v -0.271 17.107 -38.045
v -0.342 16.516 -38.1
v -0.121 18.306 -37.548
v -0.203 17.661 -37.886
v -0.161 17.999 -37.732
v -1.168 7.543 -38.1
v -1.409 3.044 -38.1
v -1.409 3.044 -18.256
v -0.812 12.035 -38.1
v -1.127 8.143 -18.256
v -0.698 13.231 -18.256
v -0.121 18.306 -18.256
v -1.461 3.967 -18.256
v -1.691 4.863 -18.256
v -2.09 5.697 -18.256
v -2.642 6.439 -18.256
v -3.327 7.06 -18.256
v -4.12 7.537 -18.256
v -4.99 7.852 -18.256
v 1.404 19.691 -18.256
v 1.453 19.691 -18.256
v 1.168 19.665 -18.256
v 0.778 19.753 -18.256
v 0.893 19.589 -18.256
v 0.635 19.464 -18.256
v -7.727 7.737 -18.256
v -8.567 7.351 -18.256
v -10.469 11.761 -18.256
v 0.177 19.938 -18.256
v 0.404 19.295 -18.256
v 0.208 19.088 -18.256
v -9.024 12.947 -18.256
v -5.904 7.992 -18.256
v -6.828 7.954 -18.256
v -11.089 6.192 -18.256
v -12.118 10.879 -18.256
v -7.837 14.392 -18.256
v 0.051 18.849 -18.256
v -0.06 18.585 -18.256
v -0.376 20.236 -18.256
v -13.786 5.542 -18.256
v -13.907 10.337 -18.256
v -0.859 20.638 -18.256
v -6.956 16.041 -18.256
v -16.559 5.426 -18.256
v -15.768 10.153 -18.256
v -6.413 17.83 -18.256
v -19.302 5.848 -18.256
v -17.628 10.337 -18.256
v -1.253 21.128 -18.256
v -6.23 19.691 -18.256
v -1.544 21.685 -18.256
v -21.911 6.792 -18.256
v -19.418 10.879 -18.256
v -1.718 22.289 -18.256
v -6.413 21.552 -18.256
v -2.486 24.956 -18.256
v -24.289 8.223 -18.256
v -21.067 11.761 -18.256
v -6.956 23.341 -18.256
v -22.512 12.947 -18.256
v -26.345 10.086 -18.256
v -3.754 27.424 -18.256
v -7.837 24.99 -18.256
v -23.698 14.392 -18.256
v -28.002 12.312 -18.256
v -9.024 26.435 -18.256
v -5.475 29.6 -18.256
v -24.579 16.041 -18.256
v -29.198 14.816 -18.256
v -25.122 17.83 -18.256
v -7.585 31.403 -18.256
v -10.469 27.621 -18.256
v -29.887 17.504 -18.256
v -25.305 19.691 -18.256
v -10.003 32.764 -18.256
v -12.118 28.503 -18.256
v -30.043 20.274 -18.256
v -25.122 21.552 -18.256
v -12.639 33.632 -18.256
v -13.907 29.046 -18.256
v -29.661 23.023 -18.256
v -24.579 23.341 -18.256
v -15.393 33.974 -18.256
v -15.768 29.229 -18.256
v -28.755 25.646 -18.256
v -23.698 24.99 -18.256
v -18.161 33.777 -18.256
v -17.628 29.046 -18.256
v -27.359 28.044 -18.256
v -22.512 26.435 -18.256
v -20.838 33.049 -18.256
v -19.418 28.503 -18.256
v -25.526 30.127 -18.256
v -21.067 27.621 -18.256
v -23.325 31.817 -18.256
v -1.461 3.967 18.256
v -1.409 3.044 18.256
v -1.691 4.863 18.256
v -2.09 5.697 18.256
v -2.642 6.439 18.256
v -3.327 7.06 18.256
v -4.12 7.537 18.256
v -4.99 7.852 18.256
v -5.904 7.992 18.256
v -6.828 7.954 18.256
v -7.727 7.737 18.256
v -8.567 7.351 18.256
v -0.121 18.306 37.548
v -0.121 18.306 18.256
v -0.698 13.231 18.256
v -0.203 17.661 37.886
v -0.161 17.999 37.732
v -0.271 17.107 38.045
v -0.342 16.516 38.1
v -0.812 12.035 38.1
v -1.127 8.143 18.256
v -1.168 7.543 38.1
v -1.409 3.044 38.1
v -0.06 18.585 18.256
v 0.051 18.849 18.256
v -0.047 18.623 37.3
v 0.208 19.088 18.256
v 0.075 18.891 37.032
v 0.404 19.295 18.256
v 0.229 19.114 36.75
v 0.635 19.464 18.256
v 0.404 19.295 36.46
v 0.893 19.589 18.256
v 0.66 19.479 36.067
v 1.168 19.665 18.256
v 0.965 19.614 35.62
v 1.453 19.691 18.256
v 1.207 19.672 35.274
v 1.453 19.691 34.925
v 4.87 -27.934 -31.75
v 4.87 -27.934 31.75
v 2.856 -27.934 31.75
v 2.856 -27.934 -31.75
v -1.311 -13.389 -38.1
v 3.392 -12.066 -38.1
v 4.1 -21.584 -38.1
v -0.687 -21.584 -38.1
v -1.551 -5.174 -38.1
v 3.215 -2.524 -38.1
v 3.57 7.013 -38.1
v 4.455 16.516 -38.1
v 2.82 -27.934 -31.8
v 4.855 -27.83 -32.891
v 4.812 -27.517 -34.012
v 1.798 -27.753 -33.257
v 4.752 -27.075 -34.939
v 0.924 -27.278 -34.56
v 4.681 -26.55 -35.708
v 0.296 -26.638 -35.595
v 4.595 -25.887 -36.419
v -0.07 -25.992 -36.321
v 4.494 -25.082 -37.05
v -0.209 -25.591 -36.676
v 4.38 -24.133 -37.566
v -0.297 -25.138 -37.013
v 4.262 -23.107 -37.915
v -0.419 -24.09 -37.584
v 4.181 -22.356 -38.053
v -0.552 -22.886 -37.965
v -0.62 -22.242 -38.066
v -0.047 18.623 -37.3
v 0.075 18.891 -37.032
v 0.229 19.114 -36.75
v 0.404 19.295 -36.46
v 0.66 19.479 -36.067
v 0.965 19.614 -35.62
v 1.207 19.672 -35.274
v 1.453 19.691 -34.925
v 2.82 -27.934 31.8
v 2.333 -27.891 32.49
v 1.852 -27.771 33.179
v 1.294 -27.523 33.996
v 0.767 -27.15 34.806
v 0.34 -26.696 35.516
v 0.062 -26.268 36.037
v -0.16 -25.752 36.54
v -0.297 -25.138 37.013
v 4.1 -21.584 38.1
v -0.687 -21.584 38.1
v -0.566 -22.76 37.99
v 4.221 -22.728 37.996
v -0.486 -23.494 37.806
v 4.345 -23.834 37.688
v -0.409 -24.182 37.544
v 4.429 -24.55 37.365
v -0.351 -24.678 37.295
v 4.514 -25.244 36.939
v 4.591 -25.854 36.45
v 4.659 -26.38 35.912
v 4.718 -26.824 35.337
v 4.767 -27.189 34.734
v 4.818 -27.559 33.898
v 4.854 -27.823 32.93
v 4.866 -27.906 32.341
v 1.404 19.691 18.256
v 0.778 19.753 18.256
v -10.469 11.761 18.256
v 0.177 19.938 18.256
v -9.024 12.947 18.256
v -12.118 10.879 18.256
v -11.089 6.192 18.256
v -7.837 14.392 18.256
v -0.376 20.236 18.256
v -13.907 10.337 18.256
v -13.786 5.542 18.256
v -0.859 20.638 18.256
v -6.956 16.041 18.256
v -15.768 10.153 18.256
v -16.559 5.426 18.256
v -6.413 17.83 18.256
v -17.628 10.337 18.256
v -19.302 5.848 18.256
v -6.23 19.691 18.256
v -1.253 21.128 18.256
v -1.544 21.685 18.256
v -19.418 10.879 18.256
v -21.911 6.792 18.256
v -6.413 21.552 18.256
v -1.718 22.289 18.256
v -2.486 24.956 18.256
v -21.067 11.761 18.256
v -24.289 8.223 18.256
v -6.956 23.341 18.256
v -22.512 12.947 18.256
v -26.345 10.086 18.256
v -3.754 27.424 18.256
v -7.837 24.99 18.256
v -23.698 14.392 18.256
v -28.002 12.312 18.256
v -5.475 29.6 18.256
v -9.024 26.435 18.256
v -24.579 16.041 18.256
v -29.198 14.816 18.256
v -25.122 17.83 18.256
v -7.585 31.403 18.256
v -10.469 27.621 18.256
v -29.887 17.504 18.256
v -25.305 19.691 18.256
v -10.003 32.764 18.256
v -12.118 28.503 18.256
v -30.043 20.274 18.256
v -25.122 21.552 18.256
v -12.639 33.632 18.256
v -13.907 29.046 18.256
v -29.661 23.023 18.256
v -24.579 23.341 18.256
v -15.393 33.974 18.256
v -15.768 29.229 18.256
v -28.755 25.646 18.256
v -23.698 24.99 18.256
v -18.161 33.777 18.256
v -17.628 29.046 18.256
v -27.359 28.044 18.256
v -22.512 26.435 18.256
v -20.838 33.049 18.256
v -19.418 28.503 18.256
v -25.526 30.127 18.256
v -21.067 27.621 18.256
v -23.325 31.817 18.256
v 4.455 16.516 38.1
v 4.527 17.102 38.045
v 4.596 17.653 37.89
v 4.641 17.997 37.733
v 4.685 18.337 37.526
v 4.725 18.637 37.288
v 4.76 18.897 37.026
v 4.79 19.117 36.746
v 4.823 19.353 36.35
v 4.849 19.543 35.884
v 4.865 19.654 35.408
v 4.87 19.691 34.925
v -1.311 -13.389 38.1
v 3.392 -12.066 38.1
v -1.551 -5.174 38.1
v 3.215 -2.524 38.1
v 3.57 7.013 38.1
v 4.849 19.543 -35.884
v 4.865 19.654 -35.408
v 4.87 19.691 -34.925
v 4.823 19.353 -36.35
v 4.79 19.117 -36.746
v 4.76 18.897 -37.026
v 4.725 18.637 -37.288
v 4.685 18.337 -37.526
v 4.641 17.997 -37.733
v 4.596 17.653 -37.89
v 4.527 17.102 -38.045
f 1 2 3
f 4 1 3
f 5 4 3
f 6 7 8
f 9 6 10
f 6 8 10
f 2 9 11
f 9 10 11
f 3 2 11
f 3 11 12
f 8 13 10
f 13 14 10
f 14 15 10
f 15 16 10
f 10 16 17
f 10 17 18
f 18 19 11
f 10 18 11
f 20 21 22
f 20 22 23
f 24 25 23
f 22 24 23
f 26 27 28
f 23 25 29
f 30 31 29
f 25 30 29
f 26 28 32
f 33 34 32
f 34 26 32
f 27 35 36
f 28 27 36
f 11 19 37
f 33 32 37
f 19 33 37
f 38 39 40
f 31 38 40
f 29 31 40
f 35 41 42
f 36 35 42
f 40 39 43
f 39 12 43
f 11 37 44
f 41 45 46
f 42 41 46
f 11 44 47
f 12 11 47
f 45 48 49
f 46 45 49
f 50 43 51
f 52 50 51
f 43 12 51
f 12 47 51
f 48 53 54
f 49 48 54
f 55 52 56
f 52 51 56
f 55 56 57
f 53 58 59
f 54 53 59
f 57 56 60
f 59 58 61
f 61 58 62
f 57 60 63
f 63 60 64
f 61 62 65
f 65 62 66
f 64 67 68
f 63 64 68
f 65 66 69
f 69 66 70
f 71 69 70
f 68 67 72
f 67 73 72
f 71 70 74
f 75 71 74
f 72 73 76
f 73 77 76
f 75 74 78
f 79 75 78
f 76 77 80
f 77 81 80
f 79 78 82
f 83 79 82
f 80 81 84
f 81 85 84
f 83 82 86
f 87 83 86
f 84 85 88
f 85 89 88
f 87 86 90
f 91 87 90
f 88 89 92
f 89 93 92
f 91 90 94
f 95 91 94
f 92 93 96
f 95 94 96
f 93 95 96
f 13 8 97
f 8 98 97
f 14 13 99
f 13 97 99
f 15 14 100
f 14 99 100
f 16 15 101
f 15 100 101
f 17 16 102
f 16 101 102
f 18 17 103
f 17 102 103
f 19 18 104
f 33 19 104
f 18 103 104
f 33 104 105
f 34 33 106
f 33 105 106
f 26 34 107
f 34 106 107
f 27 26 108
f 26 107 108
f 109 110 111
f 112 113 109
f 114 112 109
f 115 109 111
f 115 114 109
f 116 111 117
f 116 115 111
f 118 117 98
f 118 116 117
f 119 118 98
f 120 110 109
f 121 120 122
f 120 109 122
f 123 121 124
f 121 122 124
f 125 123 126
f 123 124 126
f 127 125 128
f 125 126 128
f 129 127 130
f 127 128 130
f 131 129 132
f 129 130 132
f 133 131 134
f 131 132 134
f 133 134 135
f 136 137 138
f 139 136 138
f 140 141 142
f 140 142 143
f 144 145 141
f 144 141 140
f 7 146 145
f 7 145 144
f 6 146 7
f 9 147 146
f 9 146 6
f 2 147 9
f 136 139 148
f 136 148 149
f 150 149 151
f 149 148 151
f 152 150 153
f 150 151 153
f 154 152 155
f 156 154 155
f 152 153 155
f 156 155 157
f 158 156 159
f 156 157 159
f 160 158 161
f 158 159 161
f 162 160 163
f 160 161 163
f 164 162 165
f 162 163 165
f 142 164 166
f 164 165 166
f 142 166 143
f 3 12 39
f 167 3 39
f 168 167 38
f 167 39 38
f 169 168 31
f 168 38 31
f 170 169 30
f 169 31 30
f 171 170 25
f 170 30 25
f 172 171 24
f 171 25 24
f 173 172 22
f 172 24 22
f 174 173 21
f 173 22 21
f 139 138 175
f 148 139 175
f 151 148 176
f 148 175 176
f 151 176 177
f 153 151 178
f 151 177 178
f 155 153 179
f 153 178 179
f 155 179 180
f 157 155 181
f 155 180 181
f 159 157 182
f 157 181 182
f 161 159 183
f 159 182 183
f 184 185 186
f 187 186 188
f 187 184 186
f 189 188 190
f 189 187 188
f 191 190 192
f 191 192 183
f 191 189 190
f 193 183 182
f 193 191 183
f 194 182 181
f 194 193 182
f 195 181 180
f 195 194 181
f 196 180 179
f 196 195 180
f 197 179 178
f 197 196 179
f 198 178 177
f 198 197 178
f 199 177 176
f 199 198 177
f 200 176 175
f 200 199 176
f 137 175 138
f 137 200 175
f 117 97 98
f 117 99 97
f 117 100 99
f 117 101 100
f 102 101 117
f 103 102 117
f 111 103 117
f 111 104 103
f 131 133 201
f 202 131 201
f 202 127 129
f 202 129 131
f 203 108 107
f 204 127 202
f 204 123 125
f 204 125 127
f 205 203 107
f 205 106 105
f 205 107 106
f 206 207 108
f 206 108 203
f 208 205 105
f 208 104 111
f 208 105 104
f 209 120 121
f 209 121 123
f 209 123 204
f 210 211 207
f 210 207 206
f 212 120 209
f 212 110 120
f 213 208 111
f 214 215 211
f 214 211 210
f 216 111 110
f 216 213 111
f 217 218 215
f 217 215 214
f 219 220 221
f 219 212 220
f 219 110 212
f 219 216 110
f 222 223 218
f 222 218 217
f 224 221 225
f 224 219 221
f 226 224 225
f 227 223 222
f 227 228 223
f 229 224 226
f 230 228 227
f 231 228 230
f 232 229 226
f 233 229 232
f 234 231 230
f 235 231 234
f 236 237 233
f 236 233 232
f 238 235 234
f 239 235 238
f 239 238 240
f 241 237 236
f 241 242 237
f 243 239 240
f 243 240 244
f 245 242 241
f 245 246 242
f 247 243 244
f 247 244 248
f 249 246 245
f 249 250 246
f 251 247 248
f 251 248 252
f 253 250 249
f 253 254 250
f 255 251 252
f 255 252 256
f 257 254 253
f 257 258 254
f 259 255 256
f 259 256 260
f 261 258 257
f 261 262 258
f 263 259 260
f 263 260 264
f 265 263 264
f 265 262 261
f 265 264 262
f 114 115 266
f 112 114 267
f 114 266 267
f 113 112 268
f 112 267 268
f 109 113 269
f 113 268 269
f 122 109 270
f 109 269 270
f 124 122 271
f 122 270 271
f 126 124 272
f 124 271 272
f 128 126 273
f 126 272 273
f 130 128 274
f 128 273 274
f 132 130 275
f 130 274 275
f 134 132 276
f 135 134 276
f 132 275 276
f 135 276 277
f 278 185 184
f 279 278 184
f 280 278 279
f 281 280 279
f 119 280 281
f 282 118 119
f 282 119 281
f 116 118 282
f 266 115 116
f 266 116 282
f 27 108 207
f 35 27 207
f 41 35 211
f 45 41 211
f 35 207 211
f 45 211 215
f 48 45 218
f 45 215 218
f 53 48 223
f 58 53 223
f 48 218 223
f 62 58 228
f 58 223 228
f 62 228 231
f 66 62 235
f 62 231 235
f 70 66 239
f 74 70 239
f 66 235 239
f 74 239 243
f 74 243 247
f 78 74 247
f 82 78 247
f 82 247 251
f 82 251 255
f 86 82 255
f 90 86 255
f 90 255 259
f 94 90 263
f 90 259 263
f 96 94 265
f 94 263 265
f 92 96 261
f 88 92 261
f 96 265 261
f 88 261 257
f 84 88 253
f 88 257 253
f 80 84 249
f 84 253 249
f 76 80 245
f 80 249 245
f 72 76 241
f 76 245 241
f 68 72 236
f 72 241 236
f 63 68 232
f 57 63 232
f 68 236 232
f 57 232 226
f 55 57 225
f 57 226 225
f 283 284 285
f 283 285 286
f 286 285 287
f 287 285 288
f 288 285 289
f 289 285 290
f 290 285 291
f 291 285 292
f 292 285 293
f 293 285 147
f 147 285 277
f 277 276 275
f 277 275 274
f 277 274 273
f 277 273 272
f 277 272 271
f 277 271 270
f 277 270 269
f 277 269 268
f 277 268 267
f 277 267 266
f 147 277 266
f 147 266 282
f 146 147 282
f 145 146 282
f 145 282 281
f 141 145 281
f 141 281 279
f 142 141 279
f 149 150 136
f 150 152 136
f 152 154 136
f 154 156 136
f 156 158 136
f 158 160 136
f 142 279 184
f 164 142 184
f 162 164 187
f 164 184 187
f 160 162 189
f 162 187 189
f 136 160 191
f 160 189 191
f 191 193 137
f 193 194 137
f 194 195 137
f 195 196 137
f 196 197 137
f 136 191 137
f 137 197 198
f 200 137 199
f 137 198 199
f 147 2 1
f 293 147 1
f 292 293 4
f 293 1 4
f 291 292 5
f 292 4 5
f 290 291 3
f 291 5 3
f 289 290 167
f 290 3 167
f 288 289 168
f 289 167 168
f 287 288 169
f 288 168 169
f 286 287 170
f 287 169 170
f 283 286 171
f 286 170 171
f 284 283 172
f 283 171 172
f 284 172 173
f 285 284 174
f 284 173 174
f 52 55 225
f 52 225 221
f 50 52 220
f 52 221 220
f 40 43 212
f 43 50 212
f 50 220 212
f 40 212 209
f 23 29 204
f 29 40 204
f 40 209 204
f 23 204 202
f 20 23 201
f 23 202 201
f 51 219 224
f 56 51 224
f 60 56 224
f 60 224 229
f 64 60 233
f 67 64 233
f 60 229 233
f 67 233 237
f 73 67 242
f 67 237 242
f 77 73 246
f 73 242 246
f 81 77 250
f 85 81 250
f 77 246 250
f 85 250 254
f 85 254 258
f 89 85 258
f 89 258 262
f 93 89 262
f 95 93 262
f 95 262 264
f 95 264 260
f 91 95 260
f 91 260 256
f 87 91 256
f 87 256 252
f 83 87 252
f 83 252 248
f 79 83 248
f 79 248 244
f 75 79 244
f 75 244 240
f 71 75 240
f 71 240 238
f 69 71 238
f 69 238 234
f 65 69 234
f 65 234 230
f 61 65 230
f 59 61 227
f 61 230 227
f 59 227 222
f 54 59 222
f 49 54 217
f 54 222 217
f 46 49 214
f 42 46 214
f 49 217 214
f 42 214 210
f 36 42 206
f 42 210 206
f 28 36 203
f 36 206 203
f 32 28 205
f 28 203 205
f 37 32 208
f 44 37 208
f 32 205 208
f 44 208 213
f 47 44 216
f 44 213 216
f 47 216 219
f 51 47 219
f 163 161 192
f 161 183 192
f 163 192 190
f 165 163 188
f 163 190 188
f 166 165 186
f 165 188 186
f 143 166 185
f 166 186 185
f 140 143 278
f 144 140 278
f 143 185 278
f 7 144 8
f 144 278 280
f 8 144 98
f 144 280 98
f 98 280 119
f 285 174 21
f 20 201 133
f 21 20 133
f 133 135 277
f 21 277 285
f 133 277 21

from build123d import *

# Parameters (mm, degrees)
BOSS_EXTRUDE1_DEPTH = 18.25625
SKETCH2_R           = 9.5377
CUT_EXTRUDE1_DEPTH  = 59.232550302
BOSS_EXTRUDE2_START = 19.84375
BOSS_EXTRUDE2_DEPTH = 19.84375
BOSS_EXTRUDE3_DEPTH = 19.84375
FILLET2_R           = 6.35
FILLET3_R           = 3.175
FILLET5_R           = 1.5875
FILLET6_R           = 3.175


with BuildPart() as part:
    # Sketch1 → Boss-Extrude1 (new, symmetric)
    with BuildSketch(Plane.XY):
        with BuildLine():
            Line((1.403672164, 19.691144131), (4.869734215, 19.691144131))
            ThreePointArc((4.869734215, 19.691144131), (3.208035766, -4.121355869), (4.869734215, -27.933855869))
            Line((4.869734215, -27.933855869), (0.061901788, -27.933855869))
            ThreePointArc((0.061901788, -27.933855869), (-1.356220949, -12.477586426), (-1.408740732, 3.043514659))
            ThreePointArc((-1.408740732, 3.043514659), (-3.712015543, 7.317965291), (-8.567418141, 7.350655889))
            ThreePointArc((-8.567418141, 7.350655889), (-28.755262527, 25.645771293), (-1.718407463, 22.288871403))
            ThreePointArc((-1.718407463, 22.288871403), (-0.627064659, 20.425502216), (1.403672164, 19.691144131))
        make_face()
    extrude(amount=BOSS_EXTRUDE1_DEPTH, both=True)

    # Sketch2 → Cut-Extrude1 (cut, through all)
    with BuildSketch(Plane.XY.offset(18.25625)):
        with Locations((-15.767765785, 19.691144131)):
            Circle(SKETCH2_R)
    extrude(amount=-CUT_EXTRUDE1_DEPTH, mode=Mode.SUBTRACT)

    # Sketch4 → Boss-Extrude2 (add)
    with BuildSketch(Plane.XY.offset(18.25625).offset(BOSS_EXTRUDE2_START)):
        with BuildLine():
            ThreePointArc((-1.408740732, 3.043514659), (-1.356220949, -12.477586426), (0.061901788, -27.933855869))
            Line((0.061901788, -27.933855869), (4.869734215, -27.933855869))
            ThreePointArc((4.869734215, -27.933855869), (3.208035766, -4.121355869), (4.869734215, 19.691144131))
            Line((4.869734215, 19.691144131), (1.403672164, 19.691144131))
            ThreePointArc((1.403672164, 19.691144131), (0.737132208, 19.761897123), (0.100299146, 19.971002722))
            ThreePointArc((0.100299146, 19.971002722), (-0.858408657, 11.525461487), (-1.408740732, 3.043514659))
        make_face()
    extrude(amount=-BOSS_EXTRUDE2_DEPTH)

    # Sketch5 → Boss-Extrude3 (add)
    with BuildSketch(Plane(origin=(0, 0, -18.25625), x_dir=(-1, 0, 0), z_dir=(0, 0, -1))):
        with BuildLine():
            ThreePointArc((-4.869734215, 19.691144131), (-3.208035766, -4.121355869), (-4.869734215, -27.933855869))
            Line((-4.869734215, -27.933855869), (-0.061901788, -27.933855869))
            ThreePointArc((-0.061901788, -27.933855869), (1.356220949, -12.477586426), (1.408740732, 3.043514659))
            ThreePointArc((1.408740732, 3.043514659), (0.858408657, 11.525461487), (-0.100299146, 19.971002722))
            ThreePointArc((-0.100299146, 19.971002722), (-0.737132208, 19.761897123), (-1.403672164, 19.691144131))
            Line((-1.403672164, 19.691144131), (-4.869734215, 19.691144131))
        make_face()
    extrude(amount=BOSS_EXTRUDE3_DEPTH)

    # Fillet2
    fillet2_edges = [part.edges().sort_by_distance(p)[0] for p in [
        (2.465818001, -27.933855869, 38.1),
        (2.465818001, -27.933855869, -38.1),
    ]]
    fillet(fillet2_edges, radius=FILLET2_R)

    # Fillet3
    # the kernel refuses this fillet: 3.175 mm, written as the material it takes off along each edge
    with BuildSketch(Plane(origin=(0.061901788, -27.933855869, 38.798080837), x_dir=(1, 0, 0), z_dir=(0, 0, -1))) as fillet3_piece_1:
        with BuildLine():
            CenterArc((2.793718395, -3.175), FILLET3_R, 90, 83.150253564)
            ThreePointArc((-0.358619505, -2.796330275), (-0.18490217, -1.39744793), (0, 0))
            Line((0, 0), (2.793718395, 0))
        make_face()
    extrude(amount=77.596161674, mode=Mode.SUBTRACT)

    # Fillet5
    # the kernel refuses this fillet: 1.5875 mm, written as the material it takes off along each edge
    with BuildSketch(Plane(origin=(0.100299146, 19.971002722, 42.300034066), x_dir=(-0.13199952505411708, -0.9912497795134622, 0), z_dir=(0, 0, -1)), Plane(origin=(0.100299146, 19.971002722, -18.25625), x_dir=(-0.1319995250540647, -0.9912497795134693, 0), z_dir=(0, 0, -1))) as fillet5_piece_1:
        with BuildLine():
            CenterArc((1.672445997, -1.587481962), FILLET5_R, 89.726869391, 82.687978074)
            Line((0.098836972, -1.377932716), (-0.05852393, -1.356977792))
            ThreePointArc((-0.05852393, -1.356977792), (-0.051995755, -1.307954493), (-0.152092645, -0.045490546))
            Line((-0.152092645, -0.045490546), (-0.000756763, 0.158748196))
            ThreePointArc((-0.000756763, 0.158748196), (0.840006813, 0.160752172), (1.680770389, 0.158748196))
            Line((1.680770389, 0.158748196), (1.680013626, 0))
        make_face()
    extrude(amount=24.043784066, mode=Mode.SUBTRACT)

    # Fillet6
    # the kernel refuses this fillet: 3.175 mm, written as the material it takes off along each edge
    with BuildSketch(Plane(origin=(12.807234215, 19.691144131, 38.1), x_dir=(0, -1, 0), z_dir=(-1, 0, 0)), Plane(origin=(-6.484371786, 19.691144131, -38.1), x_dir=(0, -1, 0), z_dir=(1, 0, 0))) as fillet6_piece_1:
        with BuildLine():
            CenterArc((FILLET6_R, -FILLET6_R), FILLET6_R, 90, 90)
            Line((0, -FILLET6_R), (0, 0))
            Line((0, 0), (FILLET6_R, 0))
        make_face()
    extrude(amount=19.291606, mode=Mode.SUBTRACT)


solid = part.part
